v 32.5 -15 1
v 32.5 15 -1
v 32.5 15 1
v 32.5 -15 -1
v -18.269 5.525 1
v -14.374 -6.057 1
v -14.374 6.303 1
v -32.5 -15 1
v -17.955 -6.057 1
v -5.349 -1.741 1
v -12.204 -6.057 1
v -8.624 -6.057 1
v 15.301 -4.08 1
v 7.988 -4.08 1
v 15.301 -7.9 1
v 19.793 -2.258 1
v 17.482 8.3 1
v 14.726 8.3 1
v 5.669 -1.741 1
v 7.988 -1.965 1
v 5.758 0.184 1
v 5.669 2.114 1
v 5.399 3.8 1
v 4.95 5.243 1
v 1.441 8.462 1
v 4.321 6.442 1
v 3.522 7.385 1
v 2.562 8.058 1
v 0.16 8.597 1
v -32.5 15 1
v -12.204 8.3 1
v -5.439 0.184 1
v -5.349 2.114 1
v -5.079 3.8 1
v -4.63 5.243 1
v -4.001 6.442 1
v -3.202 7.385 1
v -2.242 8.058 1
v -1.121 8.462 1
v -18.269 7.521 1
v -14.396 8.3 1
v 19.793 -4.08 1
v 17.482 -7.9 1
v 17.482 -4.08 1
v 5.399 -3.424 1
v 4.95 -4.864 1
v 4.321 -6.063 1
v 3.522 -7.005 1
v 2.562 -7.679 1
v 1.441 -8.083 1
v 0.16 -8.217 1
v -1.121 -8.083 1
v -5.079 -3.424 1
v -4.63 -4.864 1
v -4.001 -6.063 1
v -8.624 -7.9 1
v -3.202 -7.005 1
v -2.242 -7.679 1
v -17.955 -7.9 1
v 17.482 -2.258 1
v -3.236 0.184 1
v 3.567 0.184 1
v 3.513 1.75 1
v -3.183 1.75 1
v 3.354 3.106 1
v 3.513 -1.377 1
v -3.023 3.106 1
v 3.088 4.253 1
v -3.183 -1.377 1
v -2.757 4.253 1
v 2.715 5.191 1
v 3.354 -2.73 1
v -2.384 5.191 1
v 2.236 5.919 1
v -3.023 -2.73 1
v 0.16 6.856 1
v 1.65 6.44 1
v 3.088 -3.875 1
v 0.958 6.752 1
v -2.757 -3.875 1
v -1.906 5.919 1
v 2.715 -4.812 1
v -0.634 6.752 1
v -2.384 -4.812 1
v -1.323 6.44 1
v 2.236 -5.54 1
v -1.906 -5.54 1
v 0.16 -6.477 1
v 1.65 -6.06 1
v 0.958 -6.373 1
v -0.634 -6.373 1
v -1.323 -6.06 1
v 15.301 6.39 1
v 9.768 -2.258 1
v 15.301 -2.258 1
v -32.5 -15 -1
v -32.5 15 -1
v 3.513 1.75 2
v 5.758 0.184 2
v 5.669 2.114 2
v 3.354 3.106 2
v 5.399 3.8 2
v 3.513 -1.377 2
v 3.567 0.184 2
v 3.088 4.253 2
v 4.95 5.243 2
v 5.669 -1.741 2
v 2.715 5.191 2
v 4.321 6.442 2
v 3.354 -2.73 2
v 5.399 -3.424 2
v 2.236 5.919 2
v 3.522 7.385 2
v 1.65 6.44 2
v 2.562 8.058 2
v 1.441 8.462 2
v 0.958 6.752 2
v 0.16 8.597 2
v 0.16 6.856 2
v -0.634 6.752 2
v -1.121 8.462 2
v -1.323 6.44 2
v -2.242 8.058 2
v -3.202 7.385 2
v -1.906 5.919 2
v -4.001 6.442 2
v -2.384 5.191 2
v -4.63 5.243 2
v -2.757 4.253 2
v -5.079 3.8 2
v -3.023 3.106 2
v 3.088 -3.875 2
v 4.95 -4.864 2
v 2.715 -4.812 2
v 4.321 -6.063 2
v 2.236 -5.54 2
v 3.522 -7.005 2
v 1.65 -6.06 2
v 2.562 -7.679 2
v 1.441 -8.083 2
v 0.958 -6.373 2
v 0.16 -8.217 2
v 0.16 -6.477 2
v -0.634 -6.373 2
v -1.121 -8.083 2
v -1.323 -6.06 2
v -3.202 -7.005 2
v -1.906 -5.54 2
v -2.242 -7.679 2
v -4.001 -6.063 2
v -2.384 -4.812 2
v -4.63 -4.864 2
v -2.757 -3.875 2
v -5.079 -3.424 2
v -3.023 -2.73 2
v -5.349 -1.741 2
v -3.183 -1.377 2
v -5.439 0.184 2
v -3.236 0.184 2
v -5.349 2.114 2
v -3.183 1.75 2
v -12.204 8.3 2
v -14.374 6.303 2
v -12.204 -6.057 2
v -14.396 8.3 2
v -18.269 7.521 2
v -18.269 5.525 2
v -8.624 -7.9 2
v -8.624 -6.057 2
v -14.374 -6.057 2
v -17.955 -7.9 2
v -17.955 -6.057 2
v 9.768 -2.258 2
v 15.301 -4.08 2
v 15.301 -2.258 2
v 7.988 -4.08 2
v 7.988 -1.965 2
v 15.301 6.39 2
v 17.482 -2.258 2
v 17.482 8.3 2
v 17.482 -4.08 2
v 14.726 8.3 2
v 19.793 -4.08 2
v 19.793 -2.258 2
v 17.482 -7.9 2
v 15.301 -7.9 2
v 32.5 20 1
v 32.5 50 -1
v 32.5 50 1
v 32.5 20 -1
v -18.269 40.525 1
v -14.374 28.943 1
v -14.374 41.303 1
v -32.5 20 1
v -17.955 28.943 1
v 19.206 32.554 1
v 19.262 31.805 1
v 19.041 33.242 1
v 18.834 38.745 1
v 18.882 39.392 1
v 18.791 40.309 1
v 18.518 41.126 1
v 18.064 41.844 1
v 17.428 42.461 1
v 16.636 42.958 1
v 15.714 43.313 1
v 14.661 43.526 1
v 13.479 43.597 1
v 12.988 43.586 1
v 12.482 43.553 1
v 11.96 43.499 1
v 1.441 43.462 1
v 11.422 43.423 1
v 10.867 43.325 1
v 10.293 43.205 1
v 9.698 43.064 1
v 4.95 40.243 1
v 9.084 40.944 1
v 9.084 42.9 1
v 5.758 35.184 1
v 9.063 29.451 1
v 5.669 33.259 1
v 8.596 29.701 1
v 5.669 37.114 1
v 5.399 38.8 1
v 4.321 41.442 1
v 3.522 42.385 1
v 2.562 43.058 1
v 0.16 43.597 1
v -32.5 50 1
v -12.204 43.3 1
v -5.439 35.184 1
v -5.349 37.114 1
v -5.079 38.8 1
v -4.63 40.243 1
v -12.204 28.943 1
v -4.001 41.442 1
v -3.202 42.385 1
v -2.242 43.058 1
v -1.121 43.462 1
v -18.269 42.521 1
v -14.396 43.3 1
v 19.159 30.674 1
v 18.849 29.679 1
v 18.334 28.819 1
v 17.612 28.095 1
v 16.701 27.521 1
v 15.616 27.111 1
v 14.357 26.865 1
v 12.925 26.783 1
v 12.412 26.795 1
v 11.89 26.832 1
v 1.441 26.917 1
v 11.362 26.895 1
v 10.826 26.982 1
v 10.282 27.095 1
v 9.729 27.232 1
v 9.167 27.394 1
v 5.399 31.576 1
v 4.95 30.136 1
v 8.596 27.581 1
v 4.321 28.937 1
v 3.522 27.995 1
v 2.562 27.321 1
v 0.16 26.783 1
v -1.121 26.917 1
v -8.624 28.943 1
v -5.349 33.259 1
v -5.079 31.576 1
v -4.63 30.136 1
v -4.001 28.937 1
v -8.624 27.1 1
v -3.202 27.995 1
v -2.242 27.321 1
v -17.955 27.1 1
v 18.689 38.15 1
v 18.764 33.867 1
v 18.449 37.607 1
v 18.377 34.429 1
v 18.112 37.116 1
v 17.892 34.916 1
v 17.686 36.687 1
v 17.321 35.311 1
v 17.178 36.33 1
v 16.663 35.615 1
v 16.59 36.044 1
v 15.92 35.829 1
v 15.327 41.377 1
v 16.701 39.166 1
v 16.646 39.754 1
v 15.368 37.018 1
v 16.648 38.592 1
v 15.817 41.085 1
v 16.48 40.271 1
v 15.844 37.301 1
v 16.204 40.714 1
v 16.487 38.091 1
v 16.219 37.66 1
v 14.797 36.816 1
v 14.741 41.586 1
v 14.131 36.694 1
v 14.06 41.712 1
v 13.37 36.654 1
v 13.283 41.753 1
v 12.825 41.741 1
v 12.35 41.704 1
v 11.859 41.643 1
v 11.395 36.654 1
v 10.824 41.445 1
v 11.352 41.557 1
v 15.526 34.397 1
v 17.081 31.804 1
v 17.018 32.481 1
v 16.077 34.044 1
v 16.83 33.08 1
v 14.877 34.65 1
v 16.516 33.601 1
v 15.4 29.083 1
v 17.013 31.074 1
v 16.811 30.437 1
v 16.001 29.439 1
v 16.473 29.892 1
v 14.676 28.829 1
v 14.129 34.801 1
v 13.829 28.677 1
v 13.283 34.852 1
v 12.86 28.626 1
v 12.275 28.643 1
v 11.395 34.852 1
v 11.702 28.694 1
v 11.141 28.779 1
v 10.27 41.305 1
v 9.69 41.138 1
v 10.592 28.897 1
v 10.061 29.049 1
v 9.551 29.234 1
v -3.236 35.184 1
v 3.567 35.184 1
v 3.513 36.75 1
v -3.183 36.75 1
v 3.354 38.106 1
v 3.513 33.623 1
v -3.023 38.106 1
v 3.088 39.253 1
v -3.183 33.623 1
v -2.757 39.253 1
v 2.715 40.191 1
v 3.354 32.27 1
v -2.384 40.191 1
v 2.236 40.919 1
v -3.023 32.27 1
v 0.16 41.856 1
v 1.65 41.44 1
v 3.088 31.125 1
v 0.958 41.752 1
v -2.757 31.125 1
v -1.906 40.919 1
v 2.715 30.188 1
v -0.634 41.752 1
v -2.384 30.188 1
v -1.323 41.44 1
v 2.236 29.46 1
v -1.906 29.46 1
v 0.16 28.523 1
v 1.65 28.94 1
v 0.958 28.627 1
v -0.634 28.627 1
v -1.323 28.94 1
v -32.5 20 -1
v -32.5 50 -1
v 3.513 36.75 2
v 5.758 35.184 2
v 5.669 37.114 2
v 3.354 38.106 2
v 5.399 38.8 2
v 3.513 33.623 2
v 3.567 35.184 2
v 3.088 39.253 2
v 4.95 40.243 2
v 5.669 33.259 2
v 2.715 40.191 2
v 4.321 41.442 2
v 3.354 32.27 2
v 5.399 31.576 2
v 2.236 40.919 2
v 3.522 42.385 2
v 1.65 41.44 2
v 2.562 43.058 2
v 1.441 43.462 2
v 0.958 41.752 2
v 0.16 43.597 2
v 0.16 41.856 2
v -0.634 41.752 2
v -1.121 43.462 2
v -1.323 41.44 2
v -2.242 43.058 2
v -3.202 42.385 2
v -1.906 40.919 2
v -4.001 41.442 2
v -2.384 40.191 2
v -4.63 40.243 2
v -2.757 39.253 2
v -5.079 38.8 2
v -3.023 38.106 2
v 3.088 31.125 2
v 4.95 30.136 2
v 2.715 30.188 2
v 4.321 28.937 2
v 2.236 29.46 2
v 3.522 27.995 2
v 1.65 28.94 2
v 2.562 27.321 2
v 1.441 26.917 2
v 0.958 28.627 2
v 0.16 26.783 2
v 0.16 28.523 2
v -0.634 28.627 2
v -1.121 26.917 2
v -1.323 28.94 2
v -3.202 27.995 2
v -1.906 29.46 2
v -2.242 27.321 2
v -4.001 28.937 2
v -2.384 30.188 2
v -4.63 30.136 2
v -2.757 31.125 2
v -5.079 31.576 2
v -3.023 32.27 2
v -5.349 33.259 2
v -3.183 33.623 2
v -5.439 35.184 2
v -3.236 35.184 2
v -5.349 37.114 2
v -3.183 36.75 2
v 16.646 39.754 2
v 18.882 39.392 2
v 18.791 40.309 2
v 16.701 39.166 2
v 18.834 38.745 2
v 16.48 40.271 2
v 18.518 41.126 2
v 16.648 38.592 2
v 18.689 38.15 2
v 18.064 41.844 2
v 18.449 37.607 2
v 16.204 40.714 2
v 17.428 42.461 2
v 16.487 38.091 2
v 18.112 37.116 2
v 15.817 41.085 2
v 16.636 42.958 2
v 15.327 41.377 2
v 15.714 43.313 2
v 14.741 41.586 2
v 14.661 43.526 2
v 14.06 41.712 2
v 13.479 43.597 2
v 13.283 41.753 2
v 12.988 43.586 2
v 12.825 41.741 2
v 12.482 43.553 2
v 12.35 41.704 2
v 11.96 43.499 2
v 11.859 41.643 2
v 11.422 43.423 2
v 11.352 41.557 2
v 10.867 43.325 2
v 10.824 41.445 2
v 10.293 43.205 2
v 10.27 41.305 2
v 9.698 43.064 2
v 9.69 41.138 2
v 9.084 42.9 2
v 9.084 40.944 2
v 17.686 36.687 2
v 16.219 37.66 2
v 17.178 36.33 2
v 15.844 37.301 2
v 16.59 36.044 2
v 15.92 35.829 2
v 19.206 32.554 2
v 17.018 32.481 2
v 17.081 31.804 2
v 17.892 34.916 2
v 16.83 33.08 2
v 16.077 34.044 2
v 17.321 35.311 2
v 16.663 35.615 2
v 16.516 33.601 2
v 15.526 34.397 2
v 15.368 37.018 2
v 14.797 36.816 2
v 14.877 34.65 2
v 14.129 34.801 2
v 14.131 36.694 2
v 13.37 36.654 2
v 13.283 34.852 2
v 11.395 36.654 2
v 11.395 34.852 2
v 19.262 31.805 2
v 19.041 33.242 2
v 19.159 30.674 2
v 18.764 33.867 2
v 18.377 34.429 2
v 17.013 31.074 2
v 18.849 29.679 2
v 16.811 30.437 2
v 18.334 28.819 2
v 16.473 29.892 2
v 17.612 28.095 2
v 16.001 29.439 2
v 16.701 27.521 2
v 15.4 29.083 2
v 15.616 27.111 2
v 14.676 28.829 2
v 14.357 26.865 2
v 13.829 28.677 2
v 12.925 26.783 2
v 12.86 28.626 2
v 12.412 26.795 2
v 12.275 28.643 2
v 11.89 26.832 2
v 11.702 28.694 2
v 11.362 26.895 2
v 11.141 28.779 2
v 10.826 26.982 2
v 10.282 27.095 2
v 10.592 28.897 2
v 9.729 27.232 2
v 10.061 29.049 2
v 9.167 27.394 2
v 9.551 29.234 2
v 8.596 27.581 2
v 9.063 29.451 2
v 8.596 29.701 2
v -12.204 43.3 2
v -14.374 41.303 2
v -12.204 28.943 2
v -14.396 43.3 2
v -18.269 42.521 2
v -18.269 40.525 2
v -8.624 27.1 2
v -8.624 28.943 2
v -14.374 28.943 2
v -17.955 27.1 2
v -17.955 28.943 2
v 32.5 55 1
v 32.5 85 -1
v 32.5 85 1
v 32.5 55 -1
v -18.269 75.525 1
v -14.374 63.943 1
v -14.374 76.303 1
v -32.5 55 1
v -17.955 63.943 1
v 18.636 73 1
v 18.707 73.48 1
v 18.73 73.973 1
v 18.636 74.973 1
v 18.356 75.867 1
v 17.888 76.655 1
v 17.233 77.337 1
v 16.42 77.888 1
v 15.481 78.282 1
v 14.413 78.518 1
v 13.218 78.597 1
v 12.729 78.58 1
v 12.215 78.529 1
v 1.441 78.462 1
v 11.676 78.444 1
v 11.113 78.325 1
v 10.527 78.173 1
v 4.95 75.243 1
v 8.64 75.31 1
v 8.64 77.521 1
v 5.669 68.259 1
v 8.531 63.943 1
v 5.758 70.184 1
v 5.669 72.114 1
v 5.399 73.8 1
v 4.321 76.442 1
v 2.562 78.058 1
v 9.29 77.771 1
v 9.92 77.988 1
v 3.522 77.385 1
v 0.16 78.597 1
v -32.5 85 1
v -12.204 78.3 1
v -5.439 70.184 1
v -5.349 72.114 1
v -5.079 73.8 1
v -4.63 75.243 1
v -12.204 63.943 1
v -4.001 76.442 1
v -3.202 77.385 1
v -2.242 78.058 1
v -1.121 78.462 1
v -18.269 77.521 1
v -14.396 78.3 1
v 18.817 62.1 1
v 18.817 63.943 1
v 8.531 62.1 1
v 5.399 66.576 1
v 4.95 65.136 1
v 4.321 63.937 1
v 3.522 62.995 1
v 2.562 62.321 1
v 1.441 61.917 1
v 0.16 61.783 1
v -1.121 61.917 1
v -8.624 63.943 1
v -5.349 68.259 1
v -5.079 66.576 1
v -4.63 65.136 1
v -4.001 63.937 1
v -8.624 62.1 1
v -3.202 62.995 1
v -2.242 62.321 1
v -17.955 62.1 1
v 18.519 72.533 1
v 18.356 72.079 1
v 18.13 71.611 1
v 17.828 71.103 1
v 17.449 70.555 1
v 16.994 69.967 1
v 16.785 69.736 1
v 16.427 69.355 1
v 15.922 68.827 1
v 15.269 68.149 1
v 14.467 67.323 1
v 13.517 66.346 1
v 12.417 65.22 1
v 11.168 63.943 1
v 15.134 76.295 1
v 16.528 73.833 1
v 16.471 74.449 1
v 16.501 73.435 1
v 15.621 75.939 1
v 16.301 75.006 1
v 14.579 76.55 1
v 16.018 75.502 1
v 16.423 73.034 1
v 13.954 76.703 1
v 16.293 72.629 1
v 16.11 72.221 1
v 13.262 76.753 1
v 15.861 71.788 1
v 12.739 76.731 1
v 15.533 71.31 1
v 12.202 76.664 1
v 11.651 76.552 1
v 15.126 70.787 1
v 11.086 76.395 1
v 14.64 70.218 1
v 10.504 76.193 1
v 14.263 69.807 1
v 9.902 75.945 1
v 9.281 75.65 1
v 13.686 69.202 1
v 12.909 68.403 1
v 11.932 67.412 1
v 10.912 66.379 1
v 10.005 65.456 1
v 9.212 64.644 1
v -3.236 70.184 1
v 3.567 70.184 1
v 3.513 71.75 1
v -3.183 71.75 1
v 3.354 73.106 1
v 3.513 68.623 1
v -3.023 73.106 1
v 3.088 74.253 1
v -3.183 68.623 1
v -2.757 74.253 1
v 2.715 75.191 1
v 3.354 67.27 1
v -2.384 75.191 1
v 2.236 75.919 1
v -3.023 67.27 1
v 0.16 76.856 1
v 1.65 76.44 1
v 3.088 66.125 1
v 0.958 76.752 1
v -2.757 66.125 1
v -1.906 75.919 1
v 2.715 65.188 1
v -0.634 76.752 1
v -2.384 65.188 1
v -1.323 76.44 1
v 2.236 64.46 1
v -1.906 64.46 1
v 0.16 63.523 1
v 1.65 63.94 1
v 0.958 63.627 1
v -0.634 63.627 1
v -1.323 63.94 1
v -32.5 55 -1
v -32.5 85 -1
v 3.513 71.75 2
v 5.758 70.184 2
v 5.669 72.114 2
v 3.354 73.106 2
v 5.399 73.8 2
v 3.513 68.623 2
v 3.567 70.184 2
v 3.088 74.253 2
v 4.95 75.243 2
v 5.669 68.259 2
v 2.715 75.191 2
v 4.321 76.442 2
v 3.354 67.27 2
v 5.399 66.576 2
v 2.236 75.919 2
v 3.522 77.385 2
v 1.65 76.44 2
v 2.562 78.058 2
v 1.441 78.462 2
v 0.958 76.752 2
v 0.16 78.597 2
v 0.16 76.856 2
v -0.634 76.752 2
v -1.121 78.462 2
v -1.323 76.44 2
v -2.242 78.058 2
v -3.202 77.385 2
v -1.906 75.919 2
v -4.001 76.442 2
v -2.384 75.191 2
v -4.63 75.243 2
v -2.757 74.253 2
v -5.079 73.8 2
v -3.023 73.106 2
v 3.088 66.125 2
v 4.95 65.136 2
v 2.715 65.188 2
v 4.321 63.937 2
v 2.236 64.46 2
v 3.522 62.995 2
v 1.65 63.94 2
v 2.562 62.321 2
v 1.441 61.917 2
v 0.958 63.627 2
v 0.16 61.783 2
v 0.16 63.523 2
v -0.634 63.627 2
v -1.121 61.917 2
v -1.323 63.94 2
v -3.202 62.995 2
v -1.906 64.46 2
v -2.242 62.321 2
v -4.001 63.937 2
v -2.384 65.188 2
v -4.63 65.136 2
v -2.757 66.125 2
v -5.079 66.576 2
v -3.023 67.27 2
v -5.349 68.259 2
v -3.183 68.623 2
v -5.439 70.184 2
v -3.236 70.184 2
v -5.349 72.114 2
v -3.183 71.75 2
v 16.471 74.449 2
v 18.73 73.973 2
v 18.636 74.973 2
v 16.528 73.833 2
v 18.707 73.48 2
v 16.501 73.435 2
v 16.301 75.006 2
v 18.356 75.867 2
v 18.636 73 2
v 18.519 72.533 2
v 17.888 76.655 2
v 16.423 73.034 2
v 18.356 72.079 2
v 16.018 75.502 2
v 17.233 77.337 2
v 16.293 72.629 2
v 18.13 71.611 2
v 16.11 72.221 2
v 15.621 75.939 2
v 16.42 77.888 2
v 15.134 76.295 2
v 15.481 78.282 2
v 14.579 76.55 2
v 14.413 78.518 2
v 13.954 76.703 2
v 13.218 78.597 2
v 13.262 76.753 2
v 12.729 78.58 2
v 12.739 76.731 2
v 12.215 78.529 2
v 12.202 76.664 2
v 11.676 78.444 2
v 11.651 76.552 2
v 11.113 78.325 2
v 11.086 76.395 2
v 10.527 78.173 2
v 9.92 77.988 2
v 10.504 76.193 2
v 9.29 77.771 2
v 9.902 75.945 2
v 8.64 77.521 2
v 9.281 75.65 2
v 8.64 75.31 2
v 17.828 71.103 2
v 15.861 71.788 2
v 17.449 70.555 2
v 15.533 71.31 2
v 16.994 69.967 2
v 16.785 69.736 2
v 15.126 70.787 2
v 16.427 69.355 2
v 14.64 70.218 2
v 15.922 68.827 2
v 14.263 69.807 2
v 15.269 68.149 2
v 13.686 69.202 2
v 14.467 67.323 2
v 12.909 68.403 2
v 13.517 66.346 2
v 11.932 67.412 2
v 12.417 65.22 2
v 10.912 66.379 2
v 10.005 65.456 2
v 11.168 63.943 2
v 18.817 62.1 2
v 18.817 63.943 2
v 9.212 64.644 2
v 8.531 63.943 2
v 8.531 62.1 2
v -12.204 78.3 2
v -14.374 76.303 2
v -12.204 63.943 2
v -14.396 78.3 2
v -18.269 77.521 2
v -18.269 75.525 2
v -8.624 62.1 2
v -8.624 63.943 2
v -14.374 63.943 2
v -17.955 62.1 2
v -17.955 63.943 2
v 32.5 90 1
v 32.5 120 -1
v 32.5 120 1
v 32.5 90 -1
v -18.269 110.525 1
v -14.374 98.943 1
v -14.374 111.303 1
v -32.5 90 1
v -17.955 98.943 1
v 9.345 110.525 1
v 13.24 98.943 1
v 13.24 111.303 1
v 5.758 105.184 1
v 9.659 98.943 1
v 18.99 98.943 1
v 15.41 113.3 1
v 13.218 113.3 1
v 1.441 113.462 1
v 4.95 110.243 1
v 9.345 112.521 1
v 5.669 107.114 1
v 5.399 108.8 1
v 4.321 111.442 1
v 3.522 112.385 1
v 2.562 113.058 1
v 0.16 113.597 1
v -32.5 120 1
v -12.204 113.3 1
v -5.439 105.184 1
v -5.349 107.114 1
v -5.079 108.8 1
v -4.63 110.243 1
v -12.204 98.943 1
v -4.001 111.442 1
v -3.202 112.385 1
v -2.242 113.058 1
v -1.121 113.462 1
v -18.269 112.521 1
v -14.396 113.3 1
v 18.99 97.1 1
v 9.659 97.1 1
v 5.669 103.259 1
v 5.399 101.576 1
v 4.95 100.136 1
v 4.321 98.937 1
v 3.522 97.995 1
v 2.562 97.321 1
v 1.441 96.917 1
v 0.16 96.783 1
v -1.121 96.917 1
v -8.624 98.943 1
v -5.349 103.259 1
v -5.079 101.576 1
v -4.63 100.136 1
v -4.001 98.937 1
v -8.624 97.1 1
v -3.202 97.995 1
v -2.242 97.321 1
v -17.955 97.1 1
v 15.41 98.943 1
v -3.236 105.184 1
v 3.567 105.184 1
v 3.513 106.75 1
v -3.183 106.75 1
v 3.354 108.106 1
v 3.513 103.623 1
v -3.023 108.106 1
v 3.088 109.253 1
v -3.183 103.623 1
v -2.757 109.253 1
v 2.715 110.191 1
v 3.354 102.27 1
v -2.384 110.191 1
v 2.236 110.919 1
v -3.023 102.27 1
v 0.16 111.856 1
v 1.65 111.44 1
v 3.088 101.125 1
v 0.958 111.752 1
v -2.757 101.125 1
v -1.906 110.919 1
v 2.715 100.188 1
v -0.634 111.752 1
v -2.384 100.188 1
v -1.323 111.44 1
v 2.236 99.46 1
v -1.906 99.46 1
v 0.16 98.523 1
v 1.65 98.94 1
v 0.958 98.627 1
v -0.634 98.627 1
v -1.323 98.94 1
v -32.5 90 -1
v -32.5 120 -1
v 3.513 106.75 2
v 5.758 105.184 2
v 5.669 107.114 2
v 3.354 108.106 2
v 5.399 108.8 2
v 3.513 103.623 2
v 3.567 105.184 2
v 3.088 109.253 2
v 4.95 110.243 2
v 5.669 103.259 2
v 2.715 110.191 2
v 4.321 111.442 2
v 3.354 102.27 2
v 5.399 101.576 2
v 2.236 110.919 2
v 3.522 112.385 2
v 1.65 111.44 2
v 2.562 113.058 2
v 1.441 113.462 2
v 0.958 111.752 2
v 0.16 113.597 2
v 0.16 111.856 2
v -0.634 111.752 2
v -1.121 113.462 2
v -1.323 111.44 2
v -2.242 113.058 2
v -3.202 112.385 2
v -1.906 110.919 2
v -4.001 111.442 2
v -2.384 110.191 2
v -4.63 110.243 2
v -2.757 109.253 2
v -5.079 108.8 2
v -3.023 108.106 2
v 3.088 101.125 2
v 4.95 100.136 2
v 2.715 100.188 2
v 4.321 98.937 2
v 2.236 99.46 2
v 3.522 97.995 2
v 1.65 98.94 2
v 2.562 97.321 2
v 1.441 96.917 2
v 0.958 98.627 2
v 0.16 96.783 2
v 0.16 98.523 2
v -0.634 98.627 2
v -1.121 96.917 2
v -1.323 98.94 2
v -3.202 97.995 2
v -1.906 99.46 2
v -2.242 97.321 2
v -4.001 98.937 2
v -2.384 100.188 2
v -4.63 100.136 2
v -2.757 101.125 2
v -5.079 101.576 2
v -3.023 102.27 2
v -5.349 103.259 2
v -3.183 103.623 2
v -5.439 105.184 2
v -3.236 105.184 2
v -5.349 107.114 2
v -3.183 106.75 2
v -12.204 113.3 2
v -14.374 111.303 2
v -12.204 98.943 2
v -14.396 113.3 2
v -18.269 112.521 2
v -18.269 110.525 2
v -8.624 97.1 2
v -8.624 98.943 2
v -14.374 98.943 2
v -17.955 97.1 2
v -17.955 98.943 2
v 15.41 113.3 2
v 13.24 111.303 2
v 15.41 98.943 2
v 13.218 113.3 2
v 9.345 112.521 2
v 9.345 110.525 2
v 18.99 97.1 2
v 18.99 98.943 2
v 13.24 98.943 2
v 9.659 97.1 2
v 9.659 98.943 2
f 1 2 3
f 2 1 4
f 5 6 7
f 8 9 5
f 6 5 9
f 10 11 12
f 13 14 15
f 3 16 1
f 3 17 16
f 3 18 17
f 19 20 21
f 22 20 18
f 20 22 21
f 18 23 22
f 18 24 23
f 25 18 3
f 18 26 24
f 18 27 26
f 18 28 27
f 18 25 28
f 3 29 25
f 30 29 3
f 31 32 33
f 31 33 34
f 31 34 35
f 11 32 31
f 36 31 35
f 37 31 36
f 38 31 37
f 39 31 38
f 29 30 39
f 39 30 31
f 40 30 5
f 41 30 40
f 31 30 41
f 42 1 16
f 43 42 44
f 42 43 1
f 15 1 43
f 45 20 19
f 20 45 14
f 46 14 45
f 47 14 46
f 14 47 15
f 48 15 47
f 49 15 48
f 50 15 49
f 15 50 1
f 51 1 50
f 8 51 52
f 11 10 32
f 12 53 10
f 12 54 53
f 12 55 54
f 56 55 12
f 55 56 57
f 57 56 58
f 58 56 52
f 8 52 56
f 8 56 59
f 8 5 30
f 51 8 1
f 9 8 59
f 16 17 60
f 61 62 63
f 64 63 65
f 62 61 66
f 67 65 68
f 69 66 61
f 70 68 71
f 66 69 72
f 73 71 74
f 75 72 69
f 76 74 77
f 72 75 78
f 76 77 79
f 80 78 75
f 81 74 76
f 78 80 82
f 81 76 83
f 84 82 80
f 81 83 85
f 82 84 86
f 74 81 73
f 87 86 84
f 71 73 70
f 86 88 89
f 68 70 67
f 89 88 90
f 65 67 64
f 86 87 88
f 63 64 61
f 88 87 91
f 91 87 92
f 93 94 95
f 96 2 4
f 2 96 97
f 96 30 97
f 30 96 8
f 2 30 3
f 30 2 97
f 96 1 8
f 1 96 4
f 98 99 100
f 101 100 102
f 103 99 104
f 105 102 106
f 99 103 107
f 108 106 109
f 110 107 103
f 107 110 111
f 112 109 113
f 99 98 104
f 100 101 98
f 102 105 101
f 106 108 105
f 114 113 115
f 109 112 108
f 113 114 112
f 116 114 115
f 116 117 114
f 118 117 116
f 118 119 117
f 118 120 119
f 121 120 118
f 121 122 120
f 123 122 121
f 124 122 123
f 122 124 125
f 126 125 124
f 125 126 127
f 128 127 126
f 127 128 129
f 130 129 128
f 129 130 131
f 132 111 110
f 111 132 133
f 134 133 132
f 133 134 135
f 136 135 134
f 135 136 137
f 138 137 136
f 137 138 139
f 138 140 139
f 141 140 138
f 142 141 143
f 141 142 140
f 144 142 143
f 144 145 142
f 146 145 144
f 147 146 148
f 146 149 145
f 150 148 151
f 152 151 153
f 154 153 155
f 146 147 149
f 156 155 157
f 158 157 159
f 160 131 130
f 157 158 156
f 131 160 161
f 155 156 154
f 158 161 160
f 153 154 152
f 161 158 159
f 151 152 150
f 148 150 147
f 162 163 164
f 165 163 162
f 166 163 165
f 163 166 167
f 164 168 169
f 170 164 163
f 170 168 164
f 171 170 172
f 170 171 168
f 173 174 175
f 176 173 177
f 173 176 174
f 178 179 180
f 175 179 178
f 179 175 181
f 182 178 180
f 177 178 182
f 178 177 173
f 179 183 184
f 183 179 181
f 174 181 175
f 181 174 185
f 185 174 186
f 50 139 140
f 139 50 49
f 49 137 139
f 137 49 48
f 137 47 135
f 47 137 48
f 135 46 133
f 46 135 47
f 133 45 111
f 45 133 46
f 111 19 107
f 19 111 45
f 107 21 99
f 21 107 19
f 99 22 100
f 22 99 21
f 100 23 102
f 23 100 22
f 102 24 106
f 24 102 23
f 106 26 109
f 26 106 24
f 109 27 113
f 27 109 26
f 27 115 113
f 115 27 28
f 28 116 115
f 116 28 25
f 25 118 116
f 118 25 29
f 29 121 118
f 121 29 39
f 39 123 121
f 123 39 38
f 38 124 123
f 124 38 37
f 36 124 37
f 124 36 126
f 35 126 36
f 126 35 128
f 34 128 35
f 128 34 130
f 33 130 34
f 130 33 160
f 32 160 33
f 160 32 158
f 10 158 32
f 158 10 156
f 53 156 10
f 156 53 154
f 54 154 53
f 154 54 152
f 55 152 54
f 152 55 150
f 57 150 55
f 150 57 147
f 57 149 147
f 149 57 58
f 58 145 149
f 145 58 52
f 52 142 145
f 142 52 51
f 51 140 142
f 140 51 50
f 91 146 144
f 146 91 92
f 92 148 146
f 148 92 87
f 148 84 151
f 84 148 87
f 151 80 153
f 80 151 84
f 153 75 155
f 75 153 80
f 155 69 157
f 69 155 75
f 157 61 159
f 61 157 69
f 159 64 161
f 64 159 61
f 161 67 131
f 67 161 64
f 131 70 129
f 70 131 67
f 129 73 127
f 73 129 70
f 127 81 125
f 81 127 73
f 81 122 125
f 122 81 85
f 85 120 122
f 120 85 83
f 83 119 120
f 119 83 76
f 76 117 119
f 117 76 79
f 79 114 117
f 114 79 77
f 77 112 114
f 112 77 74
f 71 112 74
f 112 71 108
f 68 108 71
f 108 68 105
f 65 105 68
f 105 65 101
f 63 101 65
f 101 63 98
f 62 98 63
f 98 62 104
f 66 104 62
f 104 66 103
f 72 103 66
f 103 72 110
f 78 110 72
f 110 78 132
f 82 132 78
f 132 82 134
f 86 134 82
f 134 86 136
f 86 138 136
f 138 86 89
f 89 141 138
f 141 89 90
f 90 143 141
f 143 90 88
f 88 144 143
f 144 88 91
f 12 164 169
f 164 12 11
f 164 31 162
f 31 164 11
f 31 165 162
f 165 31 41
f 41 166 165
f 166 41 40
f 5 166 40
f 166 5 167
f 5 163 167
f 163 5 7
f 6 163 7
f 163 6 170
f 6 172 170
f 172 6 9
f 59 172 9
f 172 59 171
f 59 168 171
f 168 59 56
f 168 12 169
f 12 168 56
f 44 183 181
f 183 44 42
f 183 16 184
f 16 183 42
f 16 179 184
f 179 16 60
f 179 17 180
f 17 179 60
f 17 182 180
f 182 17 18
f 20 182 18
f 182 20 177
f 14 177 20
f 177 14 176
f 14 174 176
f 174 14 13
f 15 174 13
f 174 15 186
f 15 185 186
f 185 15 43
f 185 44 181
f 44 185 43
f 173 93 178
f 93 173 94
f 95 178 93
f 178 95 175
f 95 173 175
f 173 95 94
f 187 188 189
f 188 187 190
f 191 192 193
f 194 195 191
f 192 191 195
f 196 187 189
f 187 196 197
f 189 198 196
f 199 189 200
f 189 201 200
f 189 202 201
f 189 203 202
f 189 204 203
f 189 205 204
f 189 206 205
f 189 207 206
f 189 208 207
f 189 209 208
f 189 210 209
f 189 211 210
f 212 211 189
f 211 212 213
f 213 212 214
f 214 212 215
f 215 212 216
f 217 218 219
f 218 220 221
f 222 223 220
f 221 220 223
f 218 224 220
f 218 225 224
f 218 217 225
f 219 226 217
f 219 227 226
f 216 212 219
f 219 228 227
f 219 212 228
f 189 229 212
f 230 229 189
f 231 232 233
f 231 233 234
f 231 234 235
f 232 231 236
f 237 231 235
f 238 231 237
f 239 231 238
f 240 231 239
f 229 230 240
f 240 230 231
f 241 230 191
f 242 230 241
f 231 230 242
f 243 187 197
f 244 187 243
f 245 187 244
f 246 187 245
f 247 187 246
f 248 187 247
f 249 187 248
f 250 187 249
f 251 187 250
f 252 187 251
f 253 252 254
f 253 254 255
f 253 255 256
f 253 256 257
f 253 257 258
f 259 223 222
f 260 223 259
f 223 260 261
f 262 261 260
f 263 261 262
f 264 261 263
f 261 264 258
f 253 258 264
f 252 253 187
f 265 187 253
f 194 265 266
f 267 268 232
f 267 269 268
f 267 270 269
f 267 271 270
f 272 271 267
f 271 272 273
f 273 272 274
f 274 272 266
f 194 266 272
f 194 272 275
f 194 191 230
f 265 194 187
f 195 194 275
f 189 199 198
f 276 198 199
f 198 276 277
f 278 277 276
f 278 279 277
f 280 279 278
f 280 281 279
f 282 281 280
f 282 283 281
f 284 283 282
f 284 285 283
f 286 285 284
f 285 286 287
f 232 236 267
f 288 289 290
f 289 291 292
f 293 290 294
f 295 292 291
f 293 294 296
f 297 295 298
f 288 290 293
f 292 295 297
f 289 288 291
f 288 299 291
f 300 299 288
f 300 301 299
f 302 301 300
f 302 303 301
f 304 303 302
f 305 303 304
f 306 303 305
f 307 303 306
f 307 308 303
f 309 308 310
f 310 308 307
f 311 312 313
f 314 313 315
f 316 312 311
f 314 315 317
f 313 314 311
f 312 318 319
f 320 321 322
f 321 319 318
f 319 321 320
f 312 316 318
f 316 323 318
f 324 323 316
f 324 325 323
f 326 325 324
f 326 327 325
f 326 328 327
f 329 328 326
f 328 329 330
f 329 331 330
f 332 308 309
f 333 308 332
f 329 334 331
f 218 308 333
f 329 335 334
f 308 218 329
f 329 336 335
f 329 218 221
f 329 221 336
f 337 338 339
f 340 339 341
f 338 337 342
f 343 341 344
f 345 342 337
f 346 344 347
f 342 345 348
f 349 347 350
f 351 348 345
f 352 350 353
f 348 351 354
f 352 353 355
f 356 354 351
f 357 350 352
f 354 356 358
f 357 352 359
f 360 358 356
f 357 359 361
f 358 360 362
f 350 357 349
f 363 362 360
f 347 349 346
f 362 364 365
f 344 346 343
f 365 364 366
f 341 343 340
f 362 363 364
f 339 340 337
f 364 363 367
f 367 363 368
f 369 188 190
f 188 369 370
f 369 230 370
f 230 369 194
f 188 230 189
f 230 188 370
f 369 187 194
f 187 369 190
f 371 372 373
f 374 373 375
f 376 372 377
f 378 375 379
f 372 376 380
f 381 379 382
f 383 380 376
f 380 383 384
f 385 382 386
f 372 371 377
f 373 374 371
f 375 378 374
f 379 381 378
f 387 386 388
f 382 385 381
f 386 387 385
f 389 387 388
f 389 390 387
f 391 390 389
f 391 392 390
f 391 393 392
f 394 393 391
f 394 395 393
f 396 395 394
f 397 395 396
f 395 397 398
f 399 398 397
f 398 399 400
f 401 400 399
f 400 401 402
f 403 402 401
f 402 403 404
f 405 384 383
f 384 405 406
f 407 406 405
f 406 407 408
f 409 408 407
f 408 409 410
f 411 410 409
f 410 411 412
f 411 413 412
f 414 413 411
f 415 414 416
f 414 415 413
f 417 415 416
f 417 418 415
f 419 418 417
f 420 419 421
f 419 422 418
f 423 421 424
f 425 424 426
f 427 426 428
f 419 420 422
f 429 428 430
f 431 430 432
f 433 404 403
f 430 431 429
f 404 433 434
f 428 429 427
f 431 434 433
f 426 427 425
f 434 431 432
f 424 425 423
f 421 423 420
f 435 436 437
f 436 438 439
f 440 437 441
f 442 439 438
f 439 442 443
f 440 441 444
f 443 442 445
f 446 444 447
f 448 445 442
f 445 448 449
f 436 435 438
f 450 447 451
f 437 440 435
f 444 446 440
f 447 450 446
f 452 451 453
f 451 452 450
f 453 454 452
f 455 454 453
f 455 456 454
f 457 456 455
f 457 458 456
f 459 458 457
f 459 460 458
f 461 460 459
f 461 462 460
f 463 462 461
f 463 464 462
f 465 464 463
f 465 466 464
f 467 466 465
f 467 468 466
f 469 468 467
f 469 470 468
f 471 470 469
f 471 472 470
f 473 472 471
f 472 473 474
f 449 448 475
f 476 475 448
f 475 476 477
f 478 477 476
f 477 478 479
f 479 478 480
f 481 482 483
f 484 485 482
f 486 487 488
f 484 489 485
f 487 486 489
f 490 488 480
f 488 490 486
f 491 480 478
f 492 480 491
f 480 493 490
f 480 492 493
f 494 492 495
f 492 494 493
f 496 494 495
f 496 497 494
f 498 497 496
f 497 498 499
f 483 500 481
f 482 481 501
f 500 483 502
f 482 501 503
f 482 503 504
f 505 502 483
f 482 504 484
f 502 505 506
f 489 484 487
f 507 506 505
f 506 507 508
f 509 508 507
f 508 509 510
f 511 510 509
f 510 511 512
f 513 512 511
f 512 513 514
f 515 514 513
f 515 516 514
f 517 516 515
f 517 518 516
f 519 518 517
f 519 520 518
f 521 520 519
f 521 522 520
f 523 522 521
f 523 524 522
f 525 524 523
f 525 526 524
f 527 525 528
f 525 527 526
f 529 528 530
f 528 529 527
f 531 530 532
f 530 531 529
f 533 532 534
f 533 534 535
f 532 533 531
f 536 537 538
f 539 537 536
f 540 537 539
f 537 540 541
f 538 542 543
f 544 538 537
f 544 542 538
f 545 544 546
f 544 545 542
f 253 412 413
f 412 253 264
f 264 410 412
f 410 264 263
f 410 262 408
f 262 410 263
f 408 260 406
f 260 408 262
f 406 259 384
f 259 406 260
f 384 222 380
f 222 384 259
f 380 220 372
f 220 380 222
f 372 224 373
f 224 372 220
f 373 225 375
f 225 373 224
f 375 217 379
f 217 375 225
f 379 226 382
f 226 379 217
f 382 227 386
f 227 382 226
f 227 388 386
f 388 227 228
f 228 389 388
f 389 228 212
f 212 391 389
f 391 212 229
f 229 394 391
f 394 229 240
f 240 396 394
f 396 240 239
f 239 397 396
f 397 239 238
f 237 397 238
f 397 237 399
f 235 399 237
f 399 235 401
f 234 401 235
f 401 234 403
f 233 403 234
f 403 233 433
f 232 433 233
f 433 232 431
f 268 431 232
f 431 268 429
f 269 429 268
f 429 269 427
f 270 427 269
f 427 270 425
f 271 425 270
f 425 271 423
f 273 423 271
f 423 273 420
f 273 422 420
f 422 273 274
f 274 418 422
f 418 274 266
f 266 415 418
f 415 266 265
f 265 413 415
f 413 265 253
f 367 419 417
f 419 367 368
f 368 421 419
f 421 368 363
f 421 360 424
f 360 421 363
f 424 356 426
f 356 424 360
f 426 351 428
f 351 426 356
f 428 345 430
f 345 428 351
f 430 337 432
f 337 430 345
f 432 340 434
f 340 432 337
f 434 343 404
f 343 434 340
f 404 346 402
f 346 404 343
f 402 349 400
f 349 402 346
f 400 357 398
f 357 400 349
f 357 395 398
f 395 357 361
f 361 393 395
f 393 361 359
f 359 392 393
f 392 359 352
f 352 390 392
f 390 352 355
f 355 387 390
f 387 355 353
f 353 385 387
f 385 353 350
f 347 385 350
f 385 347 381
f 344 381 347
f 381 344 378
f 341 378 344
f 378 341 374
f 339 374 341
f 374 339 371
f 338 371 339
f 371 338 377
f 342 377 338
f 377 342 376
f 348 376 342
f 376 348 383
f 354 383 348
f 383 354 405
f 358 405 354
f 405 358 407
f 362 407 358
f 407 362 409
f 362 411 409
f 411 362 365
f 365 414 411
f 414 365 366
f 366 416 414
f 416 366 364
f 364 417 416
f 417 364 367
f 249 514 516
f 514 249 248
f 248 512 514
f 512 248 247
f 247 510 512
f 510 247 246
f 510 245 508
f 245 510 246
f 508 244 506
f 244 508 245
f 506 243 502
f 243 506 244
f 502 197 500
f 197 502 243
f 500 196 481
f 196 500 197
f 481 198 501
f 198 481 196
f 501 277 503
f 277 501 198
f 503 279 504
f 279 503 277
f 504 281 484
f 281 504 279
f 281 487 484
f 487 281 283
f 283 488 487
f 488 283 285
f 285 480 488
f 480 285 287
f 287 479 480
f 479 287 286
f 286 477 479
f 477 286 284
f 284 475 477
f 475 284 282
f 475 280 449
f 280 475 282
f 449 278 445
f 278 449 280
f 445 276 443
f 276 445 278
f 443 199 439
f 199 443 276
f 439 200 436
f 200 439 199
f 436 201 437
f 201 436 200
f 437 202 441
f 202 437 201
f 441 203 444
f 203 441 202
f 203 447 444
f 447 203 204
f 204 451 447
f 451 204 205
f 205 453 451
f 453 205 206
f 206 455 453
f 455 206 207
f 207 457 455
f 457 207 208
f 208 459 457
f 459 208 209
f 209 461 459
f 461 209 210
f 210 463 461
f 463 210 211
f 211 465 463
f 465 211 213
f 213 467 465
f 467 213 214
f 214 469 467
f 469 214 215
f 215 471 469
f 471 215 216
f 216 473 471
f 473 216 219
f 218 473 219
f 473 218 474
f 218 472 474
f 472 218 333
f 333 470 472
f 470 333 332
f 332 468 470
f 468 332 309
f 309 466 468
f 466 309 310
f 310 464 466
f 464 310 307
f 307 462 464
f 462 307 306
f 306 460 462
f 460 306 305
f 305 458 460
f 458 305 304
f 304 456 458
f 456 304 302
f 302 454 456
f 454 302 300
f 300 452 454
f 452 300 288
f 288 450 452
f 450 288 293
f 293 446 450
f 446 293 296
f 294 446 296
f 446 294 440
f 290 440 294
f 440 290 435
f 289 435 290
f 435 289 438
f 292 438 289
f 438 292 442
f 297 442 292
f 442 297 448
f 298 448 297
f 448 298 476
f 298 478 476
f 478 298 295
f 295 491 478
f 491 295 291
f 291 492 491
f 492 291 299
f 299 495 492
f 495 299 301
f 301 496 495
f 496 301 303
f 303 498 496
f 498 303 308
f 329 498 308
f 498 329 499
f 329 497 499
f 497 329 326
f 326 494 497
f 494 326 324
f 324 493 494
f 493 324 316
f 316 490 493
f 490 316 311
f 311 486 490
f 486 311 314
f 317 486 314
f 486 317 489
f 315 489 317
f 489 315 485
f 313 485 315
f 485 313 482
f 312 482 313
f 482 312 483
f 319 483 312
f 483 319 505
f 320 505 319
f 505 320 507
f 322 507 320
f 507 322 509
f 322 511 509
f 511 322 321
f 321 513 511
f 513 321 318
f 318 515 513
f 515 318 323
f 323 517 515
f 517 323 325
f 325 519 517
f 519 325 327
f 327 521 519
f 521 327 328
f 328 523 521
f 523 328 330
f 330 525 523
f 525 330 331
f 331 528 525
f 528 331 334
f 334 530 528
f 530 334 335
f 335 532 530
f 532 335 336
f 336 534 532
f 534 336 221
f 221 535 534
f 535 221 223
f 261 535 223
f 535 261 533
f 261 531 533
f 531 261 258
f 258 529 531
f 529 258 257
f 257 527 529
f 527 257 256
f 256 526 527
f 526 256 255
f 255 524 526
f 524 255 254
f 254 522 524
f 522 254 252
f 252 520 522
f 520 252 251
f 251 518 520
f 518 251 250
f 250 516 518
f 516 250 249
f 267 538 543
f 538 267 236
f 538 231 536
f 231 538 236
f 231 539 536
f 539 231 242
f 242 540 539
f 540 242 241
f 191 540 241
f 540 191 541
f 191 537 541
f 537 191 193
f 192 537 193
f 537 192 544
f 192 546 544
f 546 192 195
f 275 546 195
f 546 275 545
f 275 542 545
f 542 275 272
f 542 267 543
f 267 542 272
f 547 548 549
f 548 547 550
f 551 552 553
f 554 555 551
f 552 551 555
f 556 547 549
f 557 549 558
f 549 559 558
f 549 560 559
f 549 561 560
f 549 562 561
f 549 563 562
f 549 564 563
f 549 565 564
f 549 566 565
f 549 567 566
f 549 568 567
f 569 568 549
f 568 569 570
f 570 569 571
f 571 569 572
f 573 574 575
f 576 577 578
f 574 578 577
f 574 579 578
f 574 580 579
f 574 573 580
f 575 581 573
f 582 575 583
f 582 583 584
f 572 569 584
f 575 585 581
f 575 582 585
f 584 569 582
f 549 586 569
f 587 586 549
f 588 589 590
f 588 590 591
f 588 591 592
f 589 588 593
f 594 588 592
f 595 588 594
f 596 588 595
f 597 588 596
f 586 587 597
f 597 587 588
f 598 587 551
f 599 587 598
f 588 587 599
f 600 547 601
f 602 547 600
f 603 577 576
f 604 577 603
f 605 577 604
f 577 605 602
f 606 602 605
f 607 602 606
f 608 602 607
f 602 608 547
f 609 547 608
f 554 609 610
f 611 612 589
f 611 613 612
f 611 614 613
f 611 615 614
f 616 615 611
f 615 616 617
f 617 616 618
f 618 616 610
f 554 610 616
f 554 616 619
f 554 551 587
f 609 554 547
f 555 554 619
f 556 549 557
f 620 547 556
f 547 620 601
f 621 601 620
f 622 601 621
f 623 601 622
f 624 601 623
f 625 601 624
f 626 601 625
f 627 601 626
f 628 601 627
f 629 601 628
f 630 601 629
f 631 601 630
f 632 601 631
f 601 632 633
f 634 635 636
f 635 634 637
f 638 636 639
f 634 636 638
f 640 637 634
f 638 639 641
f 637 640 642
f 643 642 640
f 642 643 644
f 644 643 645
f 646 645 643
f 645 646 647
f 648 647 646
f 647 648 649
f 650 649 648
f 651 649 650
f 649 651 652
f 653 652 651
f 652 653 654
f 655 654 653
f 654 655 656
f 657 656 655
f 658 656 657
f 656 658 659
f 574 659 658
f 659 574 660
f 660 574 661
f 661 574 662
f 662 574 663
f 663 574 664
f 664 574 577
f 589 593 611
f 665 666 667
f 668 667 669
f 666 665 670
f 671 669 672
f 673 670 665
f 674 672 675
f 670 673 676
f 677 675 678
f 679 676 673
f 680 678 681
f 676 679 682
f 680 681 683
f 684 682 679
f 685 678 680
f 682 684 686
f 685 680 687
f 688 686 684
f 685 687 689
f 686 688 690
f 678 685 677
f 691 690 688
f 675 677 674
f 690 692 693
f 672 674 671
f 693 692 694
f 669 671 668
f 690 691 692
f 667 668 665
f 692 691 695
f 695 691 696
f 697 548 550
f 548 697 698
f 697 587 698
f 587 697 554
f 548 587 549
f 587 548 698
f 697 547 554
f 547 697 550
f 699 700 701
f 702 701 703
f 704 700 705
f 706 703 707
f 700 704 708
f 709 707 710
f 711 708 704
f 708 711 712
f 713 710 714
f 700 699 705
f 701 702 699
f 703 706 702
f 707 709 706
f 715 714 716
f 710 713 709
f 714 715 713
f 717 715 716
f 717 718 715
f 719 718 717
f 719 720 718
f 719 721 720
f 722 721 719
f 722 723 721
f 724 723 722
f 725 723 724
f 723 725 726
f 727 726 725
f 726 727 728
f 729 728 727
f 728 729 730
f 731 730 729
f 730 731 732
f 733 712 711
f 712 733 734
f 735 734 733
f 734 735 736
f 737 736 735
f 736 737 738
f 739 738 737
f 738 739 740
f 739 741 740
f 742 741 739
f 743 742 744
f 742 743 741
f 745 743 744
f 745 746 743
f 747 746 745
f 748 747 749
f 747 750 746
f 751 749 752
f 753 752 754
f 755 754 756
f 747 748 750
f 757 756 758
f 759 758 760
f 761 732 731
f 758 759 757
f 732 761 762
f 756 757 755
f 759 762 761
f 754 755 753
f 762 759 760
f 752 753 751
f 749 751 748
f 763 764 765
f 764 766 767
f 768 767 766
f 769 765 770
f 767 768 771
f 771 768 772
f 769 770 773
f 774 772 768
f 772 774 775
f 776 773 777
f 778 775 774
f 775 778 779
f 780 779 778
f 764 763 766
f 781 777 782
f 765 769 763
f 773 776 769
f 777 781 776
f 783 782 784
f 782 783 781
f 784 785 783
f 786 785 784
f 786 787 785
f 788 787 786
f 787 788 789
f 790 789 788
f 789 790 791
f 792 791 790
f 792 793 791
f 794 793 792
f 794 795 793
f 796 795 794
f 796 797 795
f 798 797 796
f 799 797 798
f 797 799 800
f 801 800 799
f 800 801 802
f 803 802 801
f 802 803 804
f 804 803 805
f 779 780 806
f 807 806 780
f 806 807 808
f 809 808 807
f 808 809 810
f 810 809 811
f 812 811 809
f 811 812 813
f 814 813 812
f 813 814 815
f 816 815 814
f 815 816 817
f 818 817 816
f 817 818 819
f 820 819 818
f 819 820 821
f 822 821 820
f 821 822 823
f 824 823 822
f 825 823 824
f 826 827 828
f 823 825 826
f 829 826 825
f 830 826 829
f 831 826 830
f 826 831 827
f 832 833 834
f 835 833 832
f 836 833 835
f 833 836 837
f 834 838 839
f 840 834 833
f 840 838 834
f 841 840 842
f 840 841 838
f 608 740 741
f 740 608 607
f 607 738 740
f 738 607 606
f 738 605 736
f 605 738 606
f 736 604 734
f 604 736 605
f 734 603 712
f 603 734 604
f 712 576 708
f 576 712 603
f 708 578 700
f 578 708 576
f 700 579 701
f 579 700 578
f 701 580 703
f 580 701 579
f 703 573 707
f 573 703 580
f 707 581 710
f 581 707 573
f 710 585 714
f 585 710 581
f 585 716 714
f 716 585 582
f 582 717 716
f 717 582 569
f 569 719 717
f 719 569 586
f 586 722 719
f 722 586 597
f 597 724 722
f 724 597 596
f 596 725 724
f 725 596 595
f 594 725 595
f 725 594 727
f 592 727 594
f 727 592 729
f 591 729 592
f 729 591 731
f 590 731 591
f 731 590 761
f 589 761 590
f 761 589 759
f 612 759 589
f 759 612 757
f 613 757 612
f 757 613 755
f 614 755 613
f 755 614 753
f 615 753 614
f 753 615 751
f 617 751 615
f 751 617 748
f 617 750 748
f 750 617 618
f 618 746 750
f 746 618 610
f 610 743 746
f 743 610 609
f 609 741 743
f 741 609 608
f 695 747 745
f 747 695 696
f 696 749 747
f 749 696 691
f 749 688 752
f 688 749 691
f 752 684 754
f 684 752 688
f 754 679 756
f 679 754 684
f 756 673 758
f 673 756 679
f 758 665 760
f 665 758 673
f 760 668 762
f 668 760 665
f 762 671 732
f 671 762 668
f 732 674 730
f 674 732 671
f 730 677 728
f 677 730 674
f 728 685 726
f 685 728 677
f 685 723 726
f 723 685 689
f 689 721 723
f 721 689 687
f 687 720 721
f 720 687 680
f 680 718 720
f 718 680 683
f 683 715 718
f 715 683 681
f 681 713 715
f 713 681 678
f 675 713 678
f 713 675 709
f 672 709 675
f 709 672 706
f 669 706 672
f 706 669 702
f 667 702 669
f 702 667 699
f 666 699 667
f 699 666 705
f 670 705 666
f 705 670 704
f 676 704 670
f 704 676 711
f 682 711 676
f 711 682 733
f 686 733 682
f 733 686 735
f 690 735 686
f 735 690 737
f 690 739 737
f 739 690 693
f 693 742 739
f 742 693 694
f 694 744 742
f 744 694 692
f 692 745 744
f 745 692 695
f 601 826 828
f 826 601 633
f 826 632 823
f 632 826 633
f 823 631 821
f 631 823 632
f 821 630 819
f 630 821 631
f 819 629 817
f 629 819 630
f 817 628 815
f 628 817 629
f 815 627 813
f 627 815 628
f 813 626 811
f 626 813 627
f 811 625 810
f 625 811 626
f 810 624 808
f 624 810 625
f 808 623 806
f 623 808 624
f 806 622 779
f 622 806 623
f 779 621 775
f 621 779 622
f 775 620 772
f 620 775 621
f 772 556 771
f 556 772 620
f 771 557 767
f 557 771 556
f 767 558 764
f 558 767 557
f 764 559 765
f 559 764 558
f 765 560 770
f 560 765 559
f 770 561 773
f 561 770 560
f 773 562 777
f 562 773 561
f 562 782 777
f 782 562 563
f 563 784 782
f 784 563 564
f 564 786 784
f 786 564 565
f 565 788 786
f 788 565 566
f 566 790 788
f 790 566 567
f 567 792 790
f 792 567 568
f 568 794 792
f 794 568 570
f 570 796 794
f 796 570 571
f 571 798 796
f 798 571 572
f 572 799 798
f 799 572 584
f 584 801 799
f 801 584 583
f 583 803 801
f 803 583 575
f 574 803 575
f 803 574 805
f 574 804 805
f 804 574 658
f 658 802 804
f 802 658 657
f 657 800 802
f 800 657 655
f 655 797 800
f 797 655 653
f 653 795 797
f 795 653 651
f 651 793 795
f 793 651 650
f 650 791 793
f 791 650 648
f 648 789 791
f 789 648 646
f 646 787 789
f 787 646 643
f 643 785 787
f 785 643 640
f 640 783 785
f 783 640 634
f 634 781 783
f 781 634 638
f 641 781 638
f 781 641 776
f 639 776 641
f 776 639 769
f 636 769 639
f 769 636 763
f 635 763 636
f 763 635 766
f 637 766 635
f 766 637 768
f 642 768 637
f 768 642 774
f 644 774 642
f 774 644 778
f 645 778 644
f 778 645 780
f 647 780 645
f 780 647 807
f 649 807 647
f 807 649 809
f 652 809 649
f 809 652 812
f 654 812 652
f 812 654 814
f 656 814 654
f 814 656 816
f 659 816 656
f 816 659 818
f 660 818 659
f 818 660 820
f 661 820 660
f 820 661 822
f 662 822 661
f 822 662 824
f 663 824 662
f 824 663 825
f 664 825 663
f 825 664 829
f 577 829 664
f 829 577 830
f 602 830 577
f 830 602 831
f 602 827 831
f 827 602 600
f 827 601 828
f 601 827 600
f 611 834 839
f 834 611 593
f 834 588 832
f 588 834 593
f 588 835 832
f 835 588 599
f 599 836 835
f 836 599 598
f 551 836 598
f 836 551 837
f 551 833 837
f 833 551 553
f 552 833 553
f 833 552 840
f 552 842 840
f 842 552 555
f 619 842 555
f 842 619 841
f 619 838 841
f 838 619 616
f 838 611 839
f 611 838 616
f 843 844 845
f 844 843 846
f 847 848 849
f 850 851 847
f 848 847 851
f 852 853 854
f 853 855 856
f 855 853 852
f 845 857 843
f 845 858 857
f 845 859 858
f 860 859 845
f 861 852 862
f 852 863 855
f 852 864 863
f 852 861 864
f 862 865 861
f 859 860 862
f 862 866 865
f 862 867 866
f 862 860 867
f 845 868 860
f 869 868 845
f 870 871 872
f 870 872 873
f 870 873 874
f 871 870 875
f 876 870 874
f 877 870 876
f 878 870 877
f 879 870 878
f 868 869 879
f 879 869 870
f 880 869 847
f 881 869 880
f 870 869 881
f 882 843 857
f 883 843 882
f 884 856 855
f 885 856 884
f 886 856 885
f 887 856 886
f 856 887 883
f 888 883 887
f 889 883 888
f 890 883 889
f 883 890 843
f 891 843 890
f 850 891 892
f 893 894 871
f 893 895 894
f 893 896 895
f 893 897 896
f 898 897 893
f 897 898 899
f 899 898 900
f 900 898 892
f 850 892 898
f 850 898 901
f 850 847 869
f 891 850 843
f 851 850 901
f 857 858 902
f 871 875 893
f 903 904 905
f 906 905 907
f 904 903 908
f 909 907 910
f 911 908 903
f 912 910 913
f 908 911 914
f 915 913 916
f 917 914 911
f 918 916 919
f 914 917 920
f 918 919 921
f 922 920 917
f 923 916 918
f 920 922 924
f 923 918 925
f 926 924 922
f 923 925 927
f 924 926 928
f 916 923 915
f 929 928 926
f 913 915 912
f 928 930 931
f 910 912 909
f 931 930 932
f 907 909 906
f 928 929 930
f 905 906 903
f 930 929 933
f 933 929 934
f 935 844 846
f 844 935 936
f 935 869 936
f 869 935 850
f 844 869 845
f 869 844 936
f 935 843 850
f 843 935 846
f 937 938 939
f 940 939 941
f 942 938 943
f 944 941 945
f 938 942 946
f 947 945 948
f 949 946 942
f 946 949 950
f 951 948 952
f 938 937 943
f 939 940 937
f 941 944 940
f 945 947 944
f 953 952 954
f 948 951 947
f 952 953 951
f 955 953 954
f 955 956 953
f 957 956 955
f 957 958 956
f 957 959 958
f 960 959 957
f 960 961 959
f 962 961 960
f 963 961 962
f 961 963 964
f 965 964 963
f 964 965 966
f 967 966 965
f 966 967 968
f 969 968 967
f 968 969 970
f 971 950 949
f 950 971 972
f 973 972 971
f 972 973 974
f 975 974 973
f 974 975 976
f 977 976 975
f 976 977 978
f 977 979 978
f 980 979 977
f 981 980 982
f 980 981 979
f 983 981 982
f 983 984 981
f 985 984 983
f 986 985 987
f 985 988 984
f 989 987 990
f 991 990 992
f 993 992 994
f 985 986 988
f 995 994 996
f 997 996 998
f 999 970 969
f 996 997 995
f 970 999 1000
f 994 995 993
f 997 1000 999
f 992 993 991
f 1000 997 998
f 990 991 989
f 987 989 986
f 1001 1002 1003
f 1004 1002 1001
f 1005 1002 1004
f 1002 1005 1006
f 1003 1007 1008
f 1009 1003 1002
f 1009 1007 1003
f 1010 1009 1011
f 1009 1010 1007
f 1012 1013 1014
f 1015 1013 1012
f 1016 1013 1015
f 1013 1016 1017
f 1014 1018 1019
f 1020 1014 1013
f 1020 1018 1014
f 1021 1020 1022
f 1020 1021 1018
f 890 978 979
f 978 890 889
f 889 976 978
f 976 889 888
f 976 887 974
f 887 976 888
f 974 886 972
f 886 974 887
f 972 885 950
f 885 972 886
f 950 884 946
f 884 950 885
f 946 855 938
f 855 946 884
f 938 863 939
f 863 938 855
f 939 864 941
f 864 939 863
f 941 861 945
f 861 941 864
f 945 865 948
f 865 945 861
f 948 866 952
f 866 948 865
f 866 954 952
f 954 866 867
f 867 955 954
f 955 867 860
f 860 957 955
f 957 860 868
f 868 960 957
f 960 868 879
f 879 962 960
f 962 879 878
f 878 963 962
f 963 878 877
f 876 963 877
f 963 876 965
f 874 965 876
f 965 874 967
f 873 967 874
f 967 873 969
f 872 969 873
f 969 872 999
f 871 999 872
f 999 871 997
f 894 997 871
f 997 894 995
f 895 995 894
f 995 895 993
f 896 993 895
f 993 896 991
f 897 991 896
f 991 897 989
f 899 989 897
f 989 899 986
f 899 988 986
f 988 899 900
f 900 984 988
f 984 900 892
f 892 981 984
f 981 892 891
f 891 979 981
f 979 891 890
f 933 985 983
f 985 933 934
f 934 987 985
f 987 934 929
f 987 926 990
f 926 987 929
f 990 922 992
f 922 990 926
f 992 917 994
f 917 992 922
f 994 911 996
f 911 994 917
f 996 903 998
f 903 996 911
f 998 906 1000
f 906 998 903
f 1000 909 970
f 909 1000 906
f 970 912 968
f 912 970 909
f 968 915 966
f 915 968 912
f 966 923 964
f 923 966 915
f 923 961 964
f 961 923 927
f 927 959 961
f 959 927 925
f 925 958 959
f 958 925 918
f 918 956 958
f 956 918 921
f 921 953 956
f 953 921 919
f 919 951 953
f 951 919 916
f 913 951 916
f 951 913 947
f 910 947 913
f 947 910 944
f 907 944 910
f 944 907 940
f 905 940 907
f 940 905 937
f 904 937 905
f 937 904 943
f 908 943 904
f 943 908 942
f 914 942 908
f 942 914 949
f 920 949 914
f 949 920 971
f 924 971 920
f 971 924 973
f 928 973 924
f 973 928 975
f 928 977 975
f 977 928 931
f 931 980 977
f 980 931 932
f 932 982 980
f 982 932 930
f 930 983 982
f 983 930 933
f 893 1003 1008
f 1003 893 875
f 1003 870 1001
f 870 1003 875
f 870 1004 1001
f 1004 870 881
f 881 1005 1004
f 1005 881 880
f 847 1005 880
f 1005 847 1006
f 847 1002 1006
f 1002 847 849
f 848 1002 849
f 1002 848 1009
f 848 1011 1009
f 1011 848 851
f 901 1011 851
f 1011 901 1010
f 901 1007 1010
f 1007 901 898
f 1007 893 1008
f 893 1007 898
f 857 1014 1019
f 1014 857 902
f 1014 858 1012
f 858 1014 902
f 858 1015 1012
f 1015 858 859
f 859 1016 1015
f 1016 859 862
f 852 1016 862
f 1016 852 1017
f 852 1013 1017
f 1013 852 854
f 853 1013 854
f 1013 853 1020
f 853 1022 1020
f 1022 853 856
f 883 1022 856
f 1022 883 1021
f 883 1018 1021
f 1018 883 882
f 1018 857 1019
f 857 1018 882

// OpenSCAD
BoxX = 65;
BoxY = 30;
BoxZ = 2;
HalfX = BoxX/2;
HalfY = BoxY/2;
UnitList2 = ["203","202","201"];
UnitList = ["104","103","102","101"];
UnitList0 = ["004","003","002","001"];


for (i=[0:len(UnitList)-1])
{
    Unit=UnitList[i];
    NewX = 0;
    NewY=(BoxY+5)*i;

    translate([NewX,NewY,0])
    {
        cube([BoxX,BoxY,BoxZ],true);
        linear_extrude(height=2, convexity=2) text(Unit,16, font="Tahoma", halign="center", valign="center");
    }
}
